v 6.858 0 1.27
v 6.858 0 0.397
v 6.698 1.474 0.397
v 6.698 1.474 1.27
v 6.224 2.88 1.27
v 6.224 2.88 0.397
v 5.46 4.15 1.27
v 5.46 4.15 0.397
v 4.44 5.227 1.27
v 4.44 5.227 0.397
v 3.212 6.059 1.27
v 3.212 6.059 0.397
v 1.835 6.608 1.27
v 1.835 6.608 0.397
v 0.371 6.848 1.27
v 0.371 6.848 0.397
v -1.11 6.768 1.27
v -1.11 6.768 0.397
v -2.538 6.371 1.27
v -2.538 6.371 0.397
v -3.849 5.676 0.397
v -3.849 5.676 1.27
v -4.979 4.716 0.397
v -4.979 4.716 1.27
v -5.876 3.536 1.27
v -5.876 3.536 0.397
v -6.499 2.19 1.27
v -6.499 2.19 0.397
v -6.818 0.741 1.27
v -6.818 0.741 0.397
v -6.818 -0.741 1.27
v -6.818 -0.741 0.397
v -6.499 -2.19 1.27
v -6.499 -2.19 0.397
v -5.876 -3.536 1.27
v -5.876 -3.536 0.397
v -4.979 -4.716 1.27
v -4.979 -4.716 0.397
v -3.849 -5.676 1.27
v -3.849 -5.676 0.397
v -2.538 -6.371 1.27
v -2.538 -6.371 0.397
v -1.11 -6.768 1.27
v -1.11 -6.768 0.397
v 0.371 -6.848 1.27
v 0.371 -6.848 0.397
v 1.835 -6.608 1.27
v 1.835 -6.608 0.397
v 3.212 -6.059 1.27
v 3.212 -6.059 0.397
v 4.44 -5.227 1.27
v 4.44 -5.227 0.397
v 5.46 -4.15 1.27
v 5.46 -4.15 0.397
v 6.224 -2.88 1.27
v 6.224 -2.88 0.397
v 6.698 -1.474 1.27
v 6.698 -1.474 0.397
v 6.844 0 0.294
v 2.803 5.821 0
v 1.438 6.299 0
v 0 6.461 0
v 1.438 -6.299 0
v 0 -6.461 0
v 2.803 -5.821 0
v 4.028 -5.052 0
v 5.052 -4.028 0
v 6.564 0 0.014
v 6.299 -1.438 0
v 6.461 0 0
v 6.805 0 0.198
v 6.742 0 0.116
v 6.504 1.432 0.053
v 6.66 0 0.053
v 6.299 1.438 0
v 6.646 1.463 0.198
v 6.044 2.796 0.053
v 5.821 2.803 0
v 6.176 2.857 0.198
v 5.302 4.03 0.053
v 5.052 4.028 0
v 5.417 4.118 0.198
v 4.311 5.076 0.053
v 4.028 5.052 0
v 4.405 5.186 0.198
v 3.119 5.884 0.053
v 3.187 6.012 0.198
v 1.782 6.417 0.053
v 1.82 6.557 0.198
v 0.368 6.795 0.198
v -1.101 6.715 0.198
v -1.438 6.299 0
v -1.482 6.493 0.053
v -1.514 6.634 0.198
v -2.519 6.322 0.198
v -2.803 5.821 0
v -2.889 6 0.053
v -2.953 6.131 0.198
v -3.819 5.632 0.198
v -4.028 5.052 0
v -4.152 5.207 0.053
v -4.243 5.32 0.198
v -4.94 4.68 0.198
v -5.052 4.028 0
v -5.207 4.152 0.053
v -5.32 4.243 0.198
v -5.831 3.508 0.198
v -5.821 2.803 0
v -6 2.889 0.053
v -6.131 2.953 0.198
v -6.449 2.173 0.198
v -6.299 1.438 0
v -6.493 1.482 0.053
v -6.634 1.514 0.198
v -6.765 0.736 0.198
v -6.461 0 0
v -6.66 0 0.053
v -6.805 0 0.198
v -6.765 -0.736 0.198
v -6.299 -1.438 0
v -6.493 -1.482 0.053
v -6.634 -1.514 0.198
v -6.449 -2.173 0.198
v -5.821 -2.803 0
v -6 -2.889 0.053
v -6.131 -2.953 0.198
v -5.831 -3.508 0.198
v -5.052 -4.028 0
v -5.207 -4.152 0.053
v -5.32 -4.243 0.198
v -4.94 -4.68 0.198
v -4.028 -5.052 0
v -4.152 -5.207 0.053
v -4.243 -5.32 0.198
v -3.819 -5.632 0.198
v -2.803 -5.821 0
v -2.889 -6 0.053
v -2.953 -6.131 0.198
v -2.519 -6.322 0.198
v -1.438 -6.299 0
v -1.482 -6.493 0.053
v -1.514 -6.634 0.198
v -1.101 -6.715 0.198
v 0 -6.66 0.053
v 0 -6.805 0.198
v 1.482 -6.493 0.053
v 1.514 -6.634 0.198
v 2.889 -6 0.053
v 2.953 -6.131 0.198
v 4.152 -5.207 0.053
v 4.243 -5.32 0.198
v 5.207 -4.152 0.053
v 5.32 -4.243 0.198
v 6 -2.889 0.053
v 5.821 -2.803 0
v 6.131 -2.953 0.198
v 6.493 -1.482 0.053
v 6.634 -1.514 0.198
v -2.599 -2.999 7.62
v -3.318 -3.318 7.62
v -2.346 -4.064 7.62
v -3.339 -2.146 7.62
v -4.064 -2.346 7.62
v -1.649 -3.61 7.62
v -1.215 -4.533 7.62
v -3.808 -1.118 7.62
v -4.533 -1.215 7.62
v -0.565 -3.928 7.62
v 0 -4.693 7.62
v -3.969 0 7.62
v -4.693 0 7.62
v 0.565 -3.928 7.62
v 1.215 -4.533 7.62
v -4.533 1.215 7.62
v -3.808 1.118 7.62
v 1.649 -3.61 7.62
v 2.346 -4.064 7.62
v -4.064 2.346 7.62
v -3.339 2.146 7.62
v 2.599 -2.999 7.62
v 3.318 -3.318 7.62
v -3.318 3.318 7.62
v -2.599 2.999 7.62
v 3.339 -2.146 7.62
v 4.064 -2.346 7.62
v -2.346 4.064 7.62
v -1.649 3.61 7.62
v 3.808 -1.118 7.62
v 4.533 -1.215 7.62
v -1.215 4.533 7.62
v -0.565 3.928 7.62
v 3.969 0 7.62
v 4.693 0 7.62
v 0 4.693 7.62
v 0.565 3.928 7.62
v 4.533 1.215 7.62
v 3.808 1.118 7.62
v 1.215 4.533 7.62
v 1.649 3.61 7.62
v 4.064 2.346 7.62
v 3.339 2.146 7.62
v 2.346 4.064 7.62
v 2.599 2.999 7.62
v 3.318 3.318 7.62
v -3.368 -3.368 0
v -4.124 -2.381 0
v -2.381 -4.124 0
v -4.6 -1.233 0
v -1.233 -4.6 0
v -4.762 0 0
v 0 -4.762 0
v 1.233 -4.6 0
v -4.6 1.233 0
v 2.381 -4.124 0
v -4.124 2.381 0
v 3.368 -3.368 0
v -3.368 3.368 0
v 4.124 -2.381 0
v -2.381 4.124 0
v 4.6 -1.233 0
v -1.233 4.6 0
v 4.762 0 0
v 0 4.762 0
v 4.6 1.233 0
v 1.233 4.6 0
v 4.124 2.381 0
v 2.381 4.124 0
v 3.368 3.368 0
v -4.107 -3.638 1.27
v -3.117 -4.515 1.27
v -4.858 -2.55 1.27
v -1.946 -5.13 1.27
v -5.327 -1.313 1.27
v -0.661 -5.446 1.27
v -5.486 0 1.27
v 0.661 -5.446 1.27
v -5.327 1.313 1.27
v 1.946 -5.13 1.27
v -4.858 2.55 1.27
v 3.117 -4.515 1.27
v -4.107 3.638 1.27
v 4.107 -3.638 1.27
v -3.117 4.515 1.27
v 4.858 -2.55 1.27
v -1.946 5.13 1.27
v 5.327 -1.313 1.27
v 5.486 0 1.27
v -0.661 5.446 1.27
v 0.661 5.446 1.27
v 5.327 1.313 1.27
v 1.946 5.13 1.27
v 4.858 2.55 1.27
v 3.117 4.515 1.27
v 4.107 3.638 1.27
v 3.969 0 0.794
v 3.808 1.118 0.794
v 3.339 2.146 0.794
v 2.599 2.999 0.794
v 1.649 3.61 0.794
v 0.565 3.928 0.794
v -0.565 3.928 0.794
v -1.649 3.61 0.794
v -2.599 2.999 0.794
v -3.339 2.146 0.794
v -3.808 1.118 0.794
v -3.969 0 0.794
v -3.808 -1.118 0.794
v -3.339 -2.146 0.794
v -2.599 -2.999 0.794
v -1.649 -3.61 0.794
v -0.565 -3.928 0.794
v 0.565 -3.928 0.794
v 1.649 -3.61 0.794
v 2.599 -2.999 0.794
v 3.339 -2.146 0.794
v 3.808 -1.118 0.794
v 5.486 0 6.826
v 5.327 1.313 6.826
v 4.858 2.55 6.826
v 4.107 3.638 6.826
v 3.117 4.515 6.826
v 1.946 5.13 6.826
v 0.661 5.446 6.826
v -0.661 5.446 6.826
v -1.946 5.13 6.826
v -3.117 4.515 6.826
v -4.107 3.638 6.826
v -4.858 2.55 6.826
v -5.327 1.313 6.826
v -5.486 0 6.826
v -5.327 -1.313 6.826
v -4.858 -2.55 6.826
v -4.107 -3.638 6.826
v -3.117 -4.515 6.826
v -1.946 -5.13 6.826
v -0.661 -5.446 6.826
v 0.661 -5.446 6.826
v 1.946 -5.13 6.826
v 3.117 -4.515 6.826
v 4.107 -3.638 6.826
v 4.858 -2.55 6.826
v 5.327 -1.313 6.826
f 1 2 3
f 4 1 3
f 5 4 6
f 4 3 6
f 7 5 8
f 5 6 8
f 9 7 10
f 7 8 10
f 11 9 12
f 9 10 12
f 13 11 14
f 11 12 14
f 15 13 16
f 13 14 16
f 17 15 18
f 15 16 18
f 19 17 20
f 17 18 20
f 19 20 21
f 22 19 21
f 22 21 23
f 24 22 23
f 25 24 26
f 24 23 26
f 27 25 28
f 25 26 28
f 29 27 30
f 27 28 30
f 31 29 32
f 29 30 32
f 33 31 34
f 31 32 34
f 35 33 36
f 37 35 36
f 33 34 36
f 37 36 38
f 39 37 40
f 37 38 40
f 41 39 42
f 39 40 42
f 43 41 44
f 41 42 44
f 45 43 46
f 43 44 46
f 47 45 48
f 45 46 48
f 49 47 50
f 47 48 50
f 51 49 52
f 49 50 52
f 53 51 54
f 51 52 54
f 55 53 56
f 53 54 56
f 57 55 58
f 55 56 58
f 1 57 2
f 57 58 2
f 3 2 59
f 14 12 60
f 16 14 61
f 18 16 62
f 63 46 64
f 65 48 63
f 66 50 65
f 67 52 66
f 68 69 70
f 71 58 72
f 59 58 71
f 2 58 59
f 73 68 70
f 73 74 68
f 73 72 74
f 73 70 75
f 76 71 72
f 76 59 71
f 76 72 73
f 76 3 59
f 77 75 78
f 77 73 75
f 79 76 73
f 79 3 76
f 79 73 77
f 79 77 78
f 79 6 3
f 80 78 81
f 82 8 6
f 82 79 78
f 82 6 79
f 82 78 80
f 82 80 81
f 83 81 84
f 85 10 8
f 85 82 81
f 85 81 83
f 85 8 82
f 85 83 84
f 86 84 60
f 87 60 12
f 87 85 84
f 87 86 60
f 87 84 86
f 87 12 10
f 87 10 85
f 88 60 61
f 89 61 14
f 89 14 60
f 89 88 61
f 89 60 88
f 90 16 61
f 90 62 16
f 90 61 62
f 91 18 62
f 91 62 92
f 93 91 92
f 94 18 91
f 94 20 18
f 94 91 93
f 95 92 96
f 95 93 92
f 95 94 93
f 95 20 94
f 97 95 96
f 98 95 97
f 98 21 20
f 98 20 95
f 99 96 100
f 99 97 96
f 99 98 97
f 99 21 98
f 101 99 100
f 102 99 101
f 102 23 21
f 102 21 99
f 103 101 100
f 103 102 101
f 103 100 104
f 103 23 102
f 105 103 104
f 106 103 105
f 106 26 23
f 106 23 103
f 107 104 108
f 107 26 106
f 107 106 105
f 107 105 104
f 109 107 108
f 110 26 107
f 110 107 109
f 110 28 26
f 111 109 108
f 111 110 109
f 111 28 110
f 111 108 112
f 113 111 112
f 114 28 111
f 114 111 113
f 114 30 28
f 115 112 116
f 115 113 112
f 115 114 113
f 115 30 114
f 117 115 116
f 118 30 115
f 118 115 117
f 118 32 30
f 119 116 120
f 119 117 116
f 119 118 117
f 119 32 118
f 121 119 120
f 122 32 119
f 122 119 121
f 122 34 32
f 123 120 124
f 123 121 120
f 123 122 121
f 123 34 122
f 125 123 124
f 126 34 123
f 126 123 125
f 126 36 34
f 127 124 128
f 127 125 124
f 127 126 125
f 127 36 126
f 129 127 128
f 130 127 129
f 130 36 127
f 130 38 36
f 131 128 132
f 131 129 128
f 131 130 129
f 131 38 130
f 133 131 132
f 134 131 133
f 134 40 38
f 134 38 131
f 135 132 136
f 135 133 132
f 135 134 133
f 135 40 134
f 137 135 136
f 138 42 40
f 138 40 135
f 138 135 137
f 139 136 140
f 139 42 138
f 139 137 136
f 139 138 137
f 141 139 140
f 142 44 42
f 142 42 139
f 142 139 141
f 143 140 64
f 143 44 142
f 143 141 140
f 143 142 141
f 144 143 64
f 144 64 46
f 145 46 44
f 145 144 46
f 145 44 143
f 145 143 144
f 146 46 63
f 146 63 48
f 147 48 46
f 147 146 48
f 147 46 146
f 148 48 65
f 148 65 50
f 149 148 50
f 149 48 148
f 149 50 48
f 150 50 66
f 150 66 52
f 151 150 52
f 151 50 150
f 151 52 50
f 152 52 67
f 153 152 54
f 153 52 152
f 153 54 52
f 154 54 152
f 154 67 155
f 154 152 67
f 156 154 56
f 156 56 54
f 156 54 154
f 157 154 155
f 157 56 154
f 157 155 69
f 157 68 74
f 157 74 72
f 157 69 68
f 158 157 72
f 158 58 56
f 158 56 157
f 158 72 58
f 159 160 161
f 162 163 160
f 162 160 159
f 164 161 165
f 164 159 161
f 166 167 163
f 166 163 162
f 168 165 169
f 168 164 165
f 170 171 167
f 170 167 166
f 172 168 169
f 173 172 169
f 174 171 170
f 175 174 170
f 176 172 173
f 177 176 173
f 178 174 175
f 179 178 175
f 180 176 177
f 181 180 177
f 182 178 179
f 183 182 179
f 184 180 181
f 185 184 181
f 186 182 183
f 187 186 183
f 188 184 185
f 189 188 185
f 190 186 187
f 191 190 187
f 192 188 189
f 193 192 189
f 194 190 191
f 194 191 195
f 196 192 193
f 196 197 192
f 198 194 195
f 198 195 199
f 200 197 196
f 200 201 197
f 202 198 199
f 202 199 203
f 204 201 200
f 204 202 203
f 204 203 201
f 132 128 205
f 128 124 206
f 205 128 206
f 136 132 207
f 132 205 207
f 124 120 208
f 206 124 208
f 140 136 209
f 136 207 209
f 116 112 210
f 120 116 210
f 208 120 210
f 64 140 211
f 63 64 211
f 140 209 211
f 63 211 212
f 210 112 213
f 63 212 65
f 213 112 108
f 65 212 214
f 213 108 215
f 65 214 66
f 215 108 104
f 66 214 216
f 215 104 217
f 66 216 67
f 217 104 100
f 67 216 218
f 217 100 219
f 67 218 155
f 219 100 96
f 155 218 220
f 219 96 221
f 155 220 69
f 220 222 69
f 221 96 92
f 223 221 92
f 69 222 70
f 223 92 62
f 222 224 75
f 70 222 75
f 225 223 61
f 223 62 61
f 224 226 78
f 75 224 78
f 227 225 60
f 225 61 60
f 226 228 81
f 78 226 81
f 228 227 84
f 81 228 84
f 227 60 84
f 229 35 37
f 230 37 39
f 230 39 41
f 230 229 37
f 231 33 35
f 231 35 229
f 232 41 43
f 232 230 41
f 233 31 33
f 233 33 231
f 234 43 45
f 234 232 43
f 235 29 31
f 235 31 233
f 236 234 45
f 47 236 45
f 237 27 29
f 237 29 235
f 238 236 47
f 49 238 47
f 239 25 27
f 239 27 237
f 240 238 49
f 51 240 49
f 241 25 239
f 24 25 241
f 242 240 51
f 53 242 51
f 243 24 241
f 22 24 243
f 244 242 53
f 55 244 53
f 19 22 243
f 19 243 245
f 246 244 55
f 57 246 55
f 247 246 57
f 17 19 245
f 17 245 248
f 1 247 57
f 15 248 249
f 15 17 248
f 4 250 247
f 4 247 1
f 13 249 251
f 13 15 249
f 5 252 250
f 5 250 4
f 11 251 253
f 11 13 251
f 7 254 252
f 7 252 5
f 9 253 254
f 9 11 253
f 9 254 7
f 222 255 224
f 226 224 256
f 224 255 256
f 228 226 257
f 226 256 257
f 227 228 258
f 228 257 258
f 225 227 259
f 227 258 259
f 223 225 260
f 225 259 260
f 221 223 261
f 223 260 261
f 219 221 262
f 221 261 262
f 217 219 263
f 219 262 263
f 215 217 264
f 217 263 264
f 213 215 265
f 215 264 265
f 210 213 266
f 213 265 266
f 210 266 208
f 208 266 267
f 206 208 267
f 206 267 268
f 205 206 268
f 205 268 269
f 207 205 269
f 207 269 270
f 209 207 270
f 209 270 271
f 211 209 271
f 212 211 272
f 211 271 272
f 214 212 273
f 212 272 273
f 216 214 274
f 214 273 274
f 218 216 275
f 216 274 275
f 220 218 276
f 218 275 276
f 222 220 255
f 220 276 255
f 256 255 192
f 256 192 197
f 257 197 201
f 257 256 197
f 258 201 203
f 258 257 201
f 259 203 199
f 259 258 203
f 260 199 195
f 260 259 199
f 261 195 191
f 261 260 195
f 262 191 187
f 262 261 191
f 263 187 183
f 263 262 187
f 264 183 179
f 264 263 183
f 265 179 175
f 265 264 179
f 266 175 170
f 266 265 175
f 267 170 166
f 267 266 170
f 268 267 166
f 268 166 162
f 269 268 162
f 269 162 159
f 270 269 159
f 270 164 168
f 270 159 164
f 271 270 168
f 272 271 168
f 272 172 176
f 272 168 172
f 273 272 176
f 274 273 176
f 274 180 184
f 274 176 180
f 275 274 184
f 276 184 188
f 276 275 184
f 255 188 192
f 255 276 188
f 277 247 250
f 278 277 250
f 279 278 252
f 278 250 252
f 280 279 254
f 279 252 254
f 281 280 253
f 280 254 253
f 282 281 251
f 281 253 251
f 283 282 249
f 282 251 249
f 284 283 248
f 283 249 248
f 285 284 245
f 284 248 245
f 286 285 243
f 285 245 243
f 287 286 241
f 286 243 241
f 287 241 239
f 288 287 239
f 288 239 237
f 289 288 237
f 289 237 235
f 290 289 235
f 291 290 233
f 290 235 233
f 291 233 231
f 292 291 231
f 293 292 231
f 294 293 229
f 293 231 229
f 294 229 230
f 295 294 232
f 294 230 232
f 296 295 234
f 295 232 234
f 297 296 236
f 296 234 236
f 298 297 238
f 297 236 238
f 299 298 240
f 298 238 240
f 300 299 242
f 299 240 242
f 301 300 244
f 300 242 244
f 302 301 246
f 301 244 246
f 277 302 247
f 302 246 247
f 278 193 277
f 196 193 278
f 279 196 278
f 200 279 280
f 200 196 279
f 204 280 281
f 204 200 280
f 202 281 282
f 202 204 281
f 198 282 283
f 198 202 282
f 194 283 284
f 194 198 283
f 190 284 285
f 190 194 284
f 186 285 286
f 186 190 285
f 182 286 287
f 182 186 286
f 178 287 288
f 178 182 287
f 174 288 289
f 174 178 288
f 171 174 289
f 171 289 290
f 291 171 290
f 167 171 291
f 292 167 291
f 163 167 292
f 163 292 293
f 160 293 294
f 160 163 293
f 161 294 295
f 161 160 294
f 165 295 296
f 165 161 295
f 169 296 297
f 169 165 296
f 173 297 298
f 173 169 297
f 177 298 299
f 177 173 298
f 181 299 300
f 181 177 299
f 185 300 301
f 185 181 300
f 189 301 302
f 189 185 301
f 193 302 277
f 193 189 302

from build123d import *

# Parameters (mm, degrees)
F0_R     = 6.858
F1_DEPTH = 1.27
F2_R     = 5.4864
F3_DEPTH = 6.35
F4_R     = 3.96875
F5_DEPTH = 25.4
F6_SIZE  = 0.79375
F7_R     = 0.396875


with BuildPart() as f1:
    # F0 (on Top) → F1 (new body)
    with BuildSketch(Plane.XY):
        Circle(F0_R)
    extrude(amount=F1_DEPTH)

    # F2 (on face) → F3 (join)
    with BuildSketch(Plane.XY.offset(1.27)):
        Circle(F2_R)
    extrude(amount=F3_DEPTH)

    # F4 (on Top) → F5 (cut)
    with BuildSketch(Plane.XY):
        Circle(F4_R)
    extrude(amount=F5_DEPTH, mode=Mode.SUBTRACT)

    # F6
    f6_edges = [f1.edges().sort_by_distance(p)[0] for p in [
        (-5.4864, 0, 7.62),
        (-3.96875, 0, 0),
    ]]
    chamfer(f6_edges, length=F6_SIZE)

    # F7
    f7_edges = [f1.edges().sort_by_distance(p)[0] for p in [
        (-6.858, 0, 0),
    ]]
    fillet(f7_edges, radius=F7_R)


solid = f1.part
